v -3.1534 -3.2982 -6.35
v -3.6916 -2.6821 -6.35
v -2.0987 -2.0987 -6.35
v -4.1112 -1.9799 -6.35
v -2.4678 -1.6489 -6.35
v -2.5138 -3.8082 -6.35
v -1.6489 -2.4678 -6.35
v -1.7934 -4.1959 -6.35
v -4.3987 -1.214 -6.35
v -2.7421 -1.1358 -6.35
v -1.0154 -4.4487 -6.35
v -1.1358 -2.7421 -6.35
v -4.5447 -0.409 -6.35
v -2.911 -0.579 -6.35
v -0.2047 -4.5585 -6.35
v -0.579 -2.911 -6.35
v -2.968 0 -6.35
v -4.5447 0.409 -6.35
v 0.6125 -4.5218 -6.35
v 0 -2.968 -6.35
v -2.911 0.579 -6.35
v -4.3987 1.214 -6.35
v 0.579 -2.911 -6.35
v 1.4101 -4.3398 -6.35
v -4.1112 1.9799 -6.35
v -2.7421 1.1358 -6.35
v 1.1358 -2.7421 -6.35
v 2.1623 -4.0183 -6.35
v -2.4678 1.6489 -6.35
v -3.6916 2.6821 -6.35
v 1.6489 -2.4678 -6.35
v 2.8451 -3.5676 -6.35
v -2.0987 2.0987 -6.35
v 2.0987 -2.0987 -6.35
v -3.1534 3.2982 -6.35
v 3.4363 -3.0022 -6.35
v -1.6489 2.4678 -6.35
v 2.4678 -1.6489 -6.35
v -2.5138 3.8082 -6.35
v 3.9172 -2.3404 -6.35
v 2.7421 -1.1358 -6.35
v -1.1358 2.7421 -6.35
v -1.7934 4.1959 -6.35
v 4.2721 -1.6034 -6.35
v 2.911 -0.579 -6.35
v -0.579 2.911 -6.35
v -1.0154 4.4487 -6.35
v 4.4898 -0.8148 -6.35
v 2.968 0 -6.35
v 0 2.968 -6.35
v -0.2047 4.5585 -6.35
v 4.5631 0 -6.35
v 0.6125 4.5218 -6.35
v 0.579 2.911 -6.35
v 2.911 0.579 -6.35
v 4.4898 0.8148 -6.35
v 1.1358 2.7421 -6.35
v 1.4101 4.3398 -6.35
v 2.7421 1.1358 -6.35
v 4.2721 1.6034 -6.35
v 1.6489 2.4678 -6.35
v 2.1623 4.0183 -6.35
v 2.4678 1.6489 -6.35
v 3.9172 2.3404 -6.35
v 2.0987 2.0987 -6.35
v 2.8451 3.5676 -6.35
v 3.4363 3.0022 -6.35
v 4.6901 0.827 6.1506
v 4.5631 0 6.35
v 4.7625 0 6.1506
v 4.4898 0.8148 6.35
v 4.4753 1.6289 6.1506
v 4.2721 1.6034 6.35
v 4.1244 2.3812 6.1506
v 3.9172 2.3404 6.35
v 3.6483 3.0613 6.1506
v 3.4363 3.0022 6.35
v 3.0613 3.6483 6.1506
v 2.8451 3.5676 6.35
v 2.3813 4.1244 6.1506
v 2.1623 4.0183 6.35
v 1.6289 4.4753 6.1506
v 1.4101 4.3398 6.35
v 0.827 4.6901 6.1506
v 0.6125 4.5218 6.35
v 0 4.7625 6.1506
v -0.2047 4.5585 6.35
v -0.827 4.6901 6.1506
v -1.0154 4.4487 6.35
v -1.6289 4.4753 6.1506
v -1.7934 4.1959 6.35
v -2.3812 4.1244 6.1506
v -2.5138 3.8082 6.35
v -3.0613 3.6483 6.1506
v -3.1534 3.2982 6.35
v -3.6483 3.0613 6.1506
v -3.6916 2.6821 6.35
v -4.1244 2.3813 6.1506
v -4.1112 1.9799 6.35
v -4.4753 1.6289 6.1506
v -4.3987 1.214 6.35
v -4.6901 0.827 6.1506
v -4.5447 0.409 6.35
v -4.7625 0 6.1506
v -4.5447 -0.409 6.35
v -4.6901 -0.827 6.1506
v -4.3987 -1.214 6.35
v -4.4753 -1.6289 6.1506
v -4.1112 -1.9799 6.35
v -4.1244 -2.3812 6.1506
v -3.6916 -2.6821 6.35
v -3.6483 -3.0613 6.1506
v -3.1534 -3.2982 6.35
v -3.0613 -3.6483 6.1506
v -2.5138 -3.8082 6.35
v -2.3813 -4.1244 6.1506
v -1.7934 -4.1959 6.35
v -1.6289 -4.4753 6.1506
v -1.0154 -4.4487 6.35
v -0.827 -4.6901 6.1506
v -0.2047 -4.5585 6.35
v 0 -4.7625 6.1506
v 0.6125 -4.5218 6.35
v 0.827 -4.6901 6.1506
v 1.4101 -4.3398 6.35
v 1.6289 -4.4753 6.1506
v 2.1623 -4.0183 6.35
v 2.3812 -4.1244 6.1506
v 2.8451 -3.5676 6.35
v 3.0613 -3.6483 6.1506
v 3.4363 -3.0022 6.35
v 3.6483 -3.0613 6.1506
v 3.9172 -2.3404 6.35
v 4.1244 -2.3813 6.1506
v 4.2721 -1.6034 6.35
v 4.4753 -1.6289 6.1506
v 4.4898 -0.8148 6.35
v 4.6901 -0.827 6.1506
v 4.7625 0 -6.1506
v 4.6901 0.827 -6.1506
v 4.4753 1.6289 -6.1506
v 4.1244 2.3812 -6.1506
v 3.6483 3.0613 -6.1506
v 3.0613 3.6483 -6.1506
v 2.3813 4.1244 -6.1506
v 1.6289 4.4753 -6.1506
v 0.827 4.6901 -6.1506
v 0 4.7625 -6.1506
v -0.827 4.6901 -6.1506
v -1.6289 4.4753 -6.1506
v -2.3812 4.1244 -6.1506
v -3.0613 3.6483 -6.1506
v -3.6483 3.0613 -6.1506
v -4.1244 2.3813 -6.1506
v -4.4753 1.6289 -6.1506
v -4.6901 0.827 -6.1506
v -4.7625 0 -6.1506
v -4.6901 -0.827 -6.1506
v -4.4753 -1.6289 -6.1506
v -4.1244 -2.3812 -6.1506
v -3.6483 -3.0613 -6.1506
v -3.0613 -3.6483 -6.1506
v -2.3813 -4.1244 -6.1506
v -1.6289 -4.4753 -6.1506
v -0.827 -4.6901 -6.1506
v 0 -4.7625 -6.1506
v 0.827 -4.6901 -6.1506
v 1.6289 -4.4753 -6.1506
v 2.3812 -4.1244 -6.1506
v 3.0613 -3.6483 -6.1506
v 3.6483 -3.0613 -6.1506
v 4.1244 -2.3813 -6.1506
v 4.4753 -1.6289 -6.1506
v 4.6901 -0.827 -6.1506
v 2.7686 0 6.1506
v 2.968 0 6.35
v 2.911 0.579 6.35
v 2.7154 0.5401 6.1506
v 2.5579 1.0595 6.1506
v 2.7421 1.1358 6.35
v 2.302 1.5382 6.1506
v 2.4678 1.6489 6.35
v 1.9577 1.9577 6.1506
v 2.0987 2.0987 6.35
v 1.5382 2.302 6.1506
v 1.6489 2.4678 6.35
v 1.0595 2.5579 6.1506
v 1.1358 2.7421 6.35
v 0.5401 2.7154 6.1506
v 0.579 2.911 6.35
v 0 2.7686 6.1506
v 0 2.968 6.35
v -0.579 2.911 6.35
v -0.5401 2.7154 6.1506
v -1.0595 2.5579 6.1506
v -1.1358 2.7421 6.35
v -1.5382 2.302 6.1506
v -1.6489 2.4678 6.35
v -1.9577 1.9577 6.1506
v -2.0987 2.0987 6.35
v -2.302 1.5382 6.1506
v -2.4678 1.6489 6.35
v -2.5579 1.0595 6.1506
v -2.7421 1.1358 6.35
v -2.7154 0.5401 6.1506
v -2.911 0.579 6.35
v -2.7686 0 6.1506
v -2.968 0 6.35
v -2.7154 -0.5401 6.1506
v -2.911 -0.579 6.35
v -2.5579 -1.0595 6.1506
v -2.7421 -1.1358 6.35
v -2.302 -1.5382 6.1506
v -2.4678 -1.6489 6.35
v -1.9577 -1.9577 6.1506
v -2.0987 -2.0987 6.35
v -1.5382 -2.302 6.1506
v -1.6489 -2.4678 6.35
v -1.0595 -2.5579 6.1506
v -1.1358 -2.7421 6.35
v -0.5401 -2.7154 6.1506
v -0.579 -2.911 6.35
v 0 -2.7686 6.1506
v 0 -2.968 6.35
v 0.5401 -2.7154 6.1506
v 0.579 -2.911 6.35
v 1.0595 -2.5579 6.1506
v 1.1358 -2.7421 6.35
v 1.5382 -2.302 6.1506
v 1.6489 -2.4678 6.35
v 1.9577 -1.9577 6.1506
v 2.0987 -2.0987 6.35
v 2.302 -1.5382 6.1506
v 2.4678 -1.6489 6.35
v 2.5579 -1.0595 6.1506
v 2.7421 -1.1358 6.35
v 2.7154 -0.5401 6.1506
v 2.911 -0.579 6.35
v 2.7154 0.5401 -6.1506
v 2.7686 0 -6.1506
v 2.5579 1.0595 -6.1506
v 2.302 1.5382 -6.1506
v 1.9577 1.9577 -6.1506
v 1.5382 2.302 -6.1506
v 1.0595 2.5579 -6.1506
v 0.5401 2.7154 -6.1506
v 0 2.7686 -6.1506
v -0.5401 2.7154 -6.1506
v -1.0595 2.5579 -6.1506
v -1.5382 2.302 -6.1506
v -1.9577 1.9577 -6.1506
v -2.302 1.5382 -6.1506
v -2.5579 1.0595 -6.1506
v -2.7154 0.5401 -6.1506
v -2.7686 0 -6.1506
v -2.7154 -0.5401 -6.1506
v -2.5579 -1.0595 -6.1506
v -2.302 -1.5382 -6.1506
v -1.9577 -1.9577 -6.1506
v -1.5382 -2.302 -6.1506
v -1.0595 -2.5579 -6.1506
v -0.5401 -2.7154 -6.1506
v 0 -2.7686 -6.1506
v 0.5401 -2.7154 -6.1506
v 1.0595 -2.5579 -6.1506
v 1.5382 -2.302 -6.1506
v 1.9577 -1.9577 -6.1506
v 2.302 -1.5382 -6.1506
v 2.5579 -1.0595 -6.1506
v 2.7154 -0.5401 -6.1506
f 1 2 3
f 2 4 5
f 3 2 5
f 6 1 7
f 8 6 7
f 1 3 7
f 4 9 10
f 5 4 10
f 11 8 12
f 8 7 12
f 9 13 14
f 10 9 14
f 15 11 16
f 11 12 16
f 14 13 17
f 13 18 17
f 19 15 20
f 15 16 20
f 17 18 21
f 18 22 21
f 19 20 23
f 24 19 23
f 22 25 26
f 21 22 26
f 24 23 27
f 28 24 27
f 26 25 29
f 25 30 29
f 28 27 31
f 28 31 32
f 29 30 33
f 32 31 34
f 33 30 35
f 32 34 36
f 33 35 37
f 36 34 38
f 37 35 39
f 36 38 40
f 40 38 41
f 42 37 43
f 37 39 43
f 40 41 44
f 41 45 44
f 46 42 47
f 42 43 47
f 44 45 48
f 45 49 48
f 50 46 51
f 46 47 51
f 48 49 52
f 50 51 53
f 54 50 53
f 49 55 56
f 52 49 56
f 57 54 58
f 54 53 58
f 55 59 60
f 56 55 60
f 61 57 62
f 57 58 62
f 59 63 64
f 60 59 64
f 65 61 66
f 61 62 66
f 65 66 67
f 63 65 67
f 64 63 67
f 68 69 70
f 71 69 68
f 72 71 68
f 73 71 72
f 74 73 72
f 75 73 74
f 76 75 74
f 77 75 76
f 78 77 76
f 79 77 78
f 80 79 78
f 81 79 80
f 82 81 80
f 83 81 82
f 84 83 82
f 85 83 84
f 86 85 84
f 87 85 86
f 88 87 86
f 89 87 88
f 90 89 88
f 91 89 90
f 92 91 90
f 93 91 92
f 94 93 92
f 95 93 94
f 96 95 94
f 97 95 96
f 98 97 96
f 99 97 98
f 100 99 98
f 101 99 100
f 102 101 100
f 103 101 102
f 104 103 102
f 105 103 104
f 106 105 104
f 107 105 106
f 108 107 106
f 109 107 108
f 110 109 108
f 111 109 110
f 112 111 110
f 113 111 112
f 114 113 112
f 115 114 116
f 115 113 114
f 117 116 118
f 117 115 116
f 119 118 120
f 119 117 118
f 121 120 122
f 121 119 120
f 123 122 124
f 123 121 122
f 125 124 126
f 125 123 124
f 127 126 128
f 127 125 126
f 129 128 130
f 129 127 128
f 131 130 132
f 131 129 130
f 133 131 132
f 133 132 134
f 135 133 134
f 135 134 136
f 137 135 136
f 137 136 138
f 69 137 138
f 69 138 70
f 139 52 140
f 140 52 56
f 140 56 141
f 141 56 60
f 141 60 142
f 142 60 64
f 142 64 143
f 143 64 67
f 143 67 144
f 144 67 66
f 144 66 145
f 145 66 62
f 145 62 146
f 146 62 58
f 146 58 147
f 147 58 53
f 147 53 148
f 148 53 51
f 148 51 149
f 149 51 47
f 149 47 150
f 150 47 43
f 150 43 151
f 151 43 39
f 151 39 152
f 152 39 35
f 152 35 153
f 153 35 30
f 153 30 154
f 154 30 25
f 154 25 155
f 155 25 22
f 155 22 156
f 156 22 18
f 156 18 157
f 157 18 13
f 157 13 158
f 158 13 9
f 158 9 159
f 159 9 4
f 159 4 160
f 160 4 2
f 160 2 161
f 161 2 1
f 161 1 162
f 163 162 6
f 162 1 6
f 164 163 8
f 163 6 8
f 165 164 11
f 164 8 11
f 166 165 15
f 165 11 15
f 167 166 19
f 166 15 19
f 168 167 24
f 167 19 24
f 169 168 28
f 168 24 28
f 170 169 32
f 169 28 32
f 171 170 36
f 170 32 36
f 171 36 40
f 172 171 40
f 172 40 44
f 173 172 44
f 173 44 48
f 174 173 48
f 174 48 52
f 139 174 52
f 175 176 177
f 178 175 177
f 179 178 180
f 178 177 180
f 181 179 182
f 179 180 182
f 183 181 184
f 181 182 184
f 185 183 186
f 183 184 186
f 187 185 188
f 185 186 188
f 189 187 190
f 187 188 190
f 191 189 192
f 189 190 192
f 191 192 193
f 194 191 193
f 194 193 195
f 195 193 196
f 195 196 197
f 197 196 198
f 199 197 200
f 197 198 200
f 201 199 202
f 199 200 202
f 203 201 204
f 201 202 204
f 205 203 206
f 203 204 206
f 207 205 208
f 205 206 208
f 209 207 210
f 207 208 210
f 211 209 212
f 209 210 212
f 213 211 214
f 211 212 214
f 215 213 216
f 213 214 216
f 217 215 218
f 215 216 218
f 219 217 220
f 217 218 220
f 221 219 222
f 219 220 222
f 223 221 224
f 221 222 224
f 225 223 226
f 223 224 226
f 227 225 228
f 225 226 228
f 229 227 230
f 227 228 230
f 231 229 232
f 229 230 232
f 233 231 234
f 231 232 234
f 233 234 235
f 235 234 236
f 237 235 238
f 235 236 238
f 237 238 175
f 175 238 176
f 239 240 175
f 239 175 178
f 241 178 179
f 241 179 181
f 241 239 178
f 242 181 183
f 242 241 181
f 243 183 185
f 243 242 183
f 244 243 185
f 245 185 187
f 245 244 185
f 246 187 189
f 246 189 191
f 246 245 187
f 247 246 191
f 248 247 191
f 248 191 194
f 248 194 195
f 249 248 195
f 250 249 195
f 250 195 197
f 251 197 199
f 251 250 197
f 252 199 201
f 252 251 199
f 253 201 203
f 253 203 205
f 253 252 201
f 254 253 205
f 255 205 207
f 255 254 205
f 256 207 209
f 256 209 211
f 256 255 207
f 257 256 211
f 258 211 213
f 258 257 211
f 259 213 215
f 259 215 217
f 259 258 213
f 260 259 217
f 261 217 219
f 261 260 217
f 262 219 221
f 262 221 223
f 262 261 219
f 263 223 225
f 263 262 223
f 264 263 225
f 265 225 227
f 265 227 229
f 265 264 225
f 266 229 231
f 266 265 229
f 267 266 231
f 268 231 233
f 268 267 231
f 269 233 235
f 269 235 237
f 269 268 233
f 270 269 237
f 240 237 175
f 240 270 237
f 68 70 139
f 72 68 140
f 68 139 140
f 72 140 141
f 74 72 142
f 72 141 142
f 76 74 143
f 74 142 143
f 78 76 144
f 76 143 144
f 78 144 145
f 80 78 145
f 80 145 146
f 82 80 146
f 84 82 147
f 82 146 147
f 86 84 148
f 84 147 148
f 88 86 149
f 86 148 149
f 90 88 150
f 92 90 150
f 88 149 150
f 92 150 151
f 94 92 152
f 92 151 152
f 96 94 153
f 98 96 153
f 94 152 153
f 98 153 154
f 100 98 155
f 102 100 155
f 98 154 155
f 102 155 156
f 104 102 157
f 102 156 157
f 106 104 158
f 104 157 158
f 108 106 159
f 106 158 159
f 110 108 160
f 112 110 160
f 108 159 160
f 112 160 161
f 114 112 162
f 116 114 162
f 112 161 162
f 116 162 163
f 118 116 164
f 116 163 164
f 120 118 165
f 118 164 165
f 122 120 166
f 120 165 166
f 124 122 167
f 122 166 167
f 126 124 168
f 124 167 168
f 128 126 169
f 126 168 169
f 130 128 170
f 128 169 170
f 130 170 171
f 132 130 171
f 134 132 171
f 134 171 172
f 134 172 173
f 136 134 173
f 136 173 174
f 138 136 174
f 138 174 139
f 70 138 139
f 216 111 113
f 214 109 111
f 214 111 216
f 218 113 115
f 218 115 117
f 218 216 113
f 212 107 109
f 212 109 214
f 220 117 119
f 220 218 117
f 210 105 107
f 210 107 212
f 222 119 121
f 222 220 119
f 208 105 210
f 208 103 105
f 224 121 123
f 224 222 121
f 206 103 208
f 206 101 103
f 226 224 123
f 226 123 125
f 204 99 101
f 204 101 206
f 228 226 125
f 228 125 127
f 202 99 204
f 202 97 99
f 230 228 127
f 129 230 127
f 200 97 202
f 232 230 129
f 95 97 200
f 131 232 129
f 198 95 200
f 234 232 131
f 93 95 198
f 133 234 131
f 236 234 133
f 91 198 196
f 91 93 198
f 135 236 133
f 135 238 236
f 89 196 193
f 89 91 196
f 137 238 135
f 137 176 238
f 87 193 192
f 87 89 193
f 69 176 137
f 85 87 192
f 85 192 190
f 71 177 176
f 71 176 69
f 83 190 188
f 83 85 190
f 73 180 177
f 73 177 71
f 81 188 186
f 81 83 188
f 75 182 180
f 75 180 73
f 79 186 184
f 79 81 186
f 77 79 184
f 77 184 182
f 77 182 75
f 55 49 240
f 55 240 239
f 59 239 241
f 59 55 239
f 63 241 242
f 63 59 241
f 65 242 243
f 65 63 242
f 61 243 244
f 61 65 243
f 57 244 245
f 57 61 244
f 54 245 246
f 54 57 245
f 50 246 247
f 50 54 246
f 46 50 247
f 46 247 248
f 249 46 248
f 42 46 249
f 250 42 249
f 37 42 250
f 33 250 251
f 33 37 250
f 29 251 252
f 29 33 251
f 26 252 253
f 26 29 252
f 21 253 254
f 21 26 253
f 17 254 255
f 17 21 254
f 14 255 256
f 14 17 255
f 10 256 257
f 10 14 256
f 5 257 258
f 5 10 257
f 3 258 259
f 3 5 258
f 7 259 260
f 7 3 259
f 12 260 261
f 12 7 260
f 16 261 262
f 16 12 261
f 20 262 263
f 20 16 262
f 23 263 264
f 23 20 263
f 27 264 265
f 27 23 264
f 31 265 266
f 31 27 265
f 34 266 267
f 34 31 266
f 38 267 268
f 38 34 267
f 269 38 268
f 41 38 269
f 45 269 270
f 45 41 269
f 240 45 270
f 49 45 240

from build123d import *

# Parameters (mm, degrees)
BOSS_EXTRUDE1_DEPTH      = 6.35
BOSS_EXTRUDE1_DEPTH_BACK = 6.35
SKETCH3_R                = 4.7625
SKETCH3_R_2              = 2.7686
CHAMFER1_SIZE            = 0.19939


with BuildPart() as part:
    # Sketch3 → Boss-Extrude1 (new, two sides: drawn at the far end of the back side and taken through both)
    with BuildSketch(Plane.XY.offset(-BOSS_EXTRUDE1_DEPTH_BACK)):
        Circle(SKETCH3_R)
        Circle(SKETCH3_R_2, mode=Mode.SUBTRACT)
    extrude(amount=BOSS_EXTRUDE1_DEPTH + BOSS_EXTRUDE1_DEPTH_BACK)

    # Chamfer1
    chamfer1_edges = [part.edges().sort_by_distance(p)[0] for p in [
        (-4.7625, 0, -6.35),
        (-2.7686, 0, -6.35),
        (-4.7625, 0, 6.35),
        (-2.7686, 0, 6.35),
    ]]
    chamfer(chamfer1_edges, length=CHAMFER1_SIZE)


solid = part.part
